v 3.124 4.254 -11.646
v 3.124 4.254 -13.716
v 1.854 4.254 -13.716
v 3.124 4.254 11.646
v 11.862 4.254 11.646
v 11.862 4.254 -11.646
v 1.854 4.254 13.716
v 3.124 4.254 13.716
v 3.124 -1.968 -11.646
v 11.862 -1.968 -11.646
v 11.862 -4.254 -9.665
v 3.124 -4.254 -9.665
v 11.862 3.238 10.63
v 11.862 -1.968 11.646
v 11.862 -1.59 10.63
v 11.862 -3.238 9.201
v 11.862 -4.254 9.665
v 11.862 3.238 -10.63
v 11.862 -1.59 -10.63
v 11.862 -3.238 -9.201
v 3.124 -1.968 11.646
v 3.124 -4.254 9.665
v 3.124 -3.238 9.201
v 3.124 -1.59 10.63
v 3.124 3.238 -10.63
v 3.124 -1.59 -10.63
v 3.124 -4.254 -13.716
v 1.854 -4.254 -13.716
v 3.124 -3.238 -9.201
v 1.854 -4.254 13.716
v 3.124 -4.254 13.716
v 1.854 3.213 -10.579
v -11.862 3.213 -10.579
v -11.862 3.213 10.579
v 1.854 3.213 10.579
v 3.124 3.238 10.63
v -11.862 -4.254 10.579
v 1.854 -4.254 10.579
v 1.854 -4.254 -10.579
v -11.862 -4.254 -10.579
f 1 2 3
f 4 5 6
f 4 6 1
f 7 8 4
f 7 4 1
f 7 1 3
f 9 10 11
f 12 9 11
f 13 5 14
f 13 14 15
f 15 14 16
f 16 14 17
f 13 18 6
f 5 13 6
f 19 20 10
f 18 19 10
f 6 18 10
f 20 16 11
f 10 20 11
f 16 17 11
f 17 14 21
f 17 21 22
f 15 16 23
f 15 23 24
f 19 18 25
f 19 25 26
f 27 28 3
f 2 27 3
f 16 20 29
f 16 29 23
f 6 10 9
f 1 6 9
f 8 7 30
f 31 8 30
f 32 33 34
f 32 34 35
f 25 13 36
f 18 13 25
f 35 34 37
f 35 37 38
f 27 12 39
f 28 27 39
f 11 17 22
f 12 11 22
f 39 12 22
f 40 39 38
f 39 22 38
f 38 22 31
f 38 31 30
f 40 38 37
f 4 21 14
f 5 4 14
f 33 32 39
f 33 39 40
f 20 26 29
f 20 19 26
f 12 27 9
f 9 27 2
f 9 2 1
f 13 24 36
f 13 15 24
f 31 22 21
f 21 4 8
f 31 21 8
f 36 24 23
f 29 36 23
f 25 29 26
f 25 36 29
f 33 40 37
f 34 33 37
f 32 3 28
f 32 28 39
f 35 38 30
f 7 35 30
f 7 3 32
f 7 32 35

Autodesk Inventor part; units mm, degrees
ref_plane "YZ Plane" through (0, 0, 0) normal (1, 0, 0) x (0, 1, 0)
ref_plane "XZ Plane" through (0, 0, 0) normal (0, 1, 0) x (-1, 0, 0)
ref_plane "XY Plane" through (0, 0, 0) normal (0, 0, 1) x (1, 0, 0)
sketch "Sketch1" plane through (0, 0, 0) normal (0, 1, 0) x (-1, 0, 0)
  line L0 (-11.8618, -11.6459) -> (11.8618, -11.6459)
  line L1 (11.8618, -11.6459) -> (11.8618, 11.6459)
  line L2 (11.8618, 11.6459) -> (-11.8618, 11.6459)
  line L3 (-11.8618, 11.6459) -> (-11.8618, -11.6459)
  line L4 (-11.8618, -11.6459) -> (11.8618, 11.6459) construction
  line L5 (11.8618, -11.6459) -> (-11.8618, 11.6459) construction
  point P0 (0, 0)
  dimension "d0" = 23.2918
  dimension "d1" = 23.7236
extrude "Extrusion1" add sketch "Sketch1" along normal mid plane 8.509
sketch "Sketch2" plane through (0, 4.2545, 0) normal (0, 1, 0) x (1, 0, 0)
  line L0 (-11.8618, 11.6459) -> (-11.8618, -11.6459) projected
  line L1 (11.8618, 11.6459) -> (-11.8618, 11.6459) projected
  line L2 (-11.8618, -11.6459) -> (1.8542, -11.6459)
  line L3 (1.8542, -11.6459) -> (1.8542, 11.6459)
  line L4 (1.8542, 11.6459) -> (-11.8618, 11.6459)
  line L5 (-11.8618, 11.6459) -> (-11.8618, -11.6459)
  point P0 (0, 0)
  dimension "d4" = 13.716
extrude "Extrusion2" cut sketch "Sketch2" against normal blind 1.0414
sketch "Sketch3" plane through (0, 3.2131, 0) normal (0, 1, 0) x (1, 0, 0)
  line L0 (-11.8618, -11.6459) -> (-11.8618, 11.6459) projected
  line L1 (1.8542, 11.6459) -> (1.8542, -11.6459) projected
  line L2 (-11.8618, -10.5791) -> (1.8542, -10.5791)
  line L3 (1.8542, -10.5791) -> (1.8542, 10.5791)
  line L4 (1.8542, 10.5791) -> (-11.8618, 10.5791)
  line L5 (-11.8618, 10.5791) -> (-11.8618, -10.5791)
  line L6 (1.8542, -11.6459) -> (-11.8618, -11.6459) projected
  line L7 (-11.8618, 11.6459) -> (1.8542, 11.6459) projected
  line L8 (1.8542, -11.6459) -> (1.8542, -10.5791)
  line L9 (1.8542, 11.6459) -> (1.8542, 10.5791)
  point P0 (0, 0)
  dimension "d7" = 1.0668
  dimension "d8" = 21.1582
  dimension "d9" = 1.0668
extrude "Extrusion3" cut sketch "Sketch3" against normal up to surface (7.4676 mm away) contours L0 L2 L1 L6 | L0 L7 L1 L4
sketch "Sketch4" plane through (1.8542, 4.2545, -11.6459) normal (-1, 0, 0) x (0, 0, 1)
  line L0 (-2.0701, 0) -> (25.3619, 0)
  line L1 (25.3619, 0) -> (25.3619, -8.509)
  line L2 (25.3619, -8.509) -> (-2.0701, -8.509)
  line L3 (-2.0701, -8.509) -> (-2.0701, 0)
  line L4 (23.2918, -8.509) -> (22.225, -8.509) projected
  line L5 (0, 0) -> (23.2918, 0) projected
  line L6 (23.2918, 0) -> (23.2918, -8.509) projected
  line L7 (0, -8.509) -> (0, 0) projected
  point P0 (11.6459, -4.2545)
  dimension "d12" = 27.432
  dimension "d13" = 2.0701
  dimension "d14" = 2.0701
extrude "Extrusion4" add sketch "Sketch4" against normal blind 1.27 contours L0 L7 L2 L3 | L0 L1 L2 L6
sketch "Sketch5" plane through (11.8618, -4.2545, -11.6459) normal (1, 0, 0) x (0, 0, -1)
  line L0 (-23.2918, 8.509) -> (-23.2918, 0) projected
  line L1 (-23.2918, 2.286) -> (-21.3106, 0)
  line L2 (-21.3106, 0) -> (-1.9812, 0)
  line L3 (0, 0) -> (-23.2918, 0) projected
  line L4 (0, 0) -> (0, 8.509) projected
  line L5 (0, 2.286) -> (-1.9812, 0)
  point P0 (-11.6459, 4.2545)
  dimension "d17" = 19.3294
  dimension "d20" = 6.223
  dimension "d21" = 139.086
  dimension "d22" = 139.086
extrude "Extrusion5" cut sketch "Sketch5" against normal up to surface (8.7376 mm away)
sketch "Sketch6" plane through (11.8618, 4.2545, 11.6459) normal (1, 0, 0) x (0, 0, -1)
  line L0 (21.3106, -8.509) -> (23.2918, -6.223) projected
  line L1 (23.2918, -6.223) -> (23.2918, 0) projected
  line L2 (0, 0) -> (23.2918, 0) projected
  line L3 (0, -6.223) -> (0, 0) projected
  line L4 (0, -6.223) -> (1.9812, -8.509) projected
  line L5 (21.3106, -8.509) -> (1.9812, -8.509) projected
  line L6 (2.4451, -7.493) -> (1.016, -5.844)
  line L7 (1.016, -5.844) -> (1.016, -1.016)
  line L8 (1.016, -1.016) -> (22.2758, -1.016)
  line L9 (22.2758, -1.016) -> (22.2758, -5.844)
  line L10 (22.2758, -5.844) -> (20.8467, -7.493)
  line L11 (20.8467, -7.493) -> (2.4451, -7.493)
  point P0 (11.6459, -4.2545)
  dimension "d25" = 1.016
extrude "Extrusion6" cut sketch "Sketch6" against normal up to surface (8.7376 mm away) contours L6 L7 L8 L9 L10 L11
equation "\"d7\" = d9"
equation "\"d13\" = d14"
equation "\"d21\" = d22"
properties part number "MolexConnector"
